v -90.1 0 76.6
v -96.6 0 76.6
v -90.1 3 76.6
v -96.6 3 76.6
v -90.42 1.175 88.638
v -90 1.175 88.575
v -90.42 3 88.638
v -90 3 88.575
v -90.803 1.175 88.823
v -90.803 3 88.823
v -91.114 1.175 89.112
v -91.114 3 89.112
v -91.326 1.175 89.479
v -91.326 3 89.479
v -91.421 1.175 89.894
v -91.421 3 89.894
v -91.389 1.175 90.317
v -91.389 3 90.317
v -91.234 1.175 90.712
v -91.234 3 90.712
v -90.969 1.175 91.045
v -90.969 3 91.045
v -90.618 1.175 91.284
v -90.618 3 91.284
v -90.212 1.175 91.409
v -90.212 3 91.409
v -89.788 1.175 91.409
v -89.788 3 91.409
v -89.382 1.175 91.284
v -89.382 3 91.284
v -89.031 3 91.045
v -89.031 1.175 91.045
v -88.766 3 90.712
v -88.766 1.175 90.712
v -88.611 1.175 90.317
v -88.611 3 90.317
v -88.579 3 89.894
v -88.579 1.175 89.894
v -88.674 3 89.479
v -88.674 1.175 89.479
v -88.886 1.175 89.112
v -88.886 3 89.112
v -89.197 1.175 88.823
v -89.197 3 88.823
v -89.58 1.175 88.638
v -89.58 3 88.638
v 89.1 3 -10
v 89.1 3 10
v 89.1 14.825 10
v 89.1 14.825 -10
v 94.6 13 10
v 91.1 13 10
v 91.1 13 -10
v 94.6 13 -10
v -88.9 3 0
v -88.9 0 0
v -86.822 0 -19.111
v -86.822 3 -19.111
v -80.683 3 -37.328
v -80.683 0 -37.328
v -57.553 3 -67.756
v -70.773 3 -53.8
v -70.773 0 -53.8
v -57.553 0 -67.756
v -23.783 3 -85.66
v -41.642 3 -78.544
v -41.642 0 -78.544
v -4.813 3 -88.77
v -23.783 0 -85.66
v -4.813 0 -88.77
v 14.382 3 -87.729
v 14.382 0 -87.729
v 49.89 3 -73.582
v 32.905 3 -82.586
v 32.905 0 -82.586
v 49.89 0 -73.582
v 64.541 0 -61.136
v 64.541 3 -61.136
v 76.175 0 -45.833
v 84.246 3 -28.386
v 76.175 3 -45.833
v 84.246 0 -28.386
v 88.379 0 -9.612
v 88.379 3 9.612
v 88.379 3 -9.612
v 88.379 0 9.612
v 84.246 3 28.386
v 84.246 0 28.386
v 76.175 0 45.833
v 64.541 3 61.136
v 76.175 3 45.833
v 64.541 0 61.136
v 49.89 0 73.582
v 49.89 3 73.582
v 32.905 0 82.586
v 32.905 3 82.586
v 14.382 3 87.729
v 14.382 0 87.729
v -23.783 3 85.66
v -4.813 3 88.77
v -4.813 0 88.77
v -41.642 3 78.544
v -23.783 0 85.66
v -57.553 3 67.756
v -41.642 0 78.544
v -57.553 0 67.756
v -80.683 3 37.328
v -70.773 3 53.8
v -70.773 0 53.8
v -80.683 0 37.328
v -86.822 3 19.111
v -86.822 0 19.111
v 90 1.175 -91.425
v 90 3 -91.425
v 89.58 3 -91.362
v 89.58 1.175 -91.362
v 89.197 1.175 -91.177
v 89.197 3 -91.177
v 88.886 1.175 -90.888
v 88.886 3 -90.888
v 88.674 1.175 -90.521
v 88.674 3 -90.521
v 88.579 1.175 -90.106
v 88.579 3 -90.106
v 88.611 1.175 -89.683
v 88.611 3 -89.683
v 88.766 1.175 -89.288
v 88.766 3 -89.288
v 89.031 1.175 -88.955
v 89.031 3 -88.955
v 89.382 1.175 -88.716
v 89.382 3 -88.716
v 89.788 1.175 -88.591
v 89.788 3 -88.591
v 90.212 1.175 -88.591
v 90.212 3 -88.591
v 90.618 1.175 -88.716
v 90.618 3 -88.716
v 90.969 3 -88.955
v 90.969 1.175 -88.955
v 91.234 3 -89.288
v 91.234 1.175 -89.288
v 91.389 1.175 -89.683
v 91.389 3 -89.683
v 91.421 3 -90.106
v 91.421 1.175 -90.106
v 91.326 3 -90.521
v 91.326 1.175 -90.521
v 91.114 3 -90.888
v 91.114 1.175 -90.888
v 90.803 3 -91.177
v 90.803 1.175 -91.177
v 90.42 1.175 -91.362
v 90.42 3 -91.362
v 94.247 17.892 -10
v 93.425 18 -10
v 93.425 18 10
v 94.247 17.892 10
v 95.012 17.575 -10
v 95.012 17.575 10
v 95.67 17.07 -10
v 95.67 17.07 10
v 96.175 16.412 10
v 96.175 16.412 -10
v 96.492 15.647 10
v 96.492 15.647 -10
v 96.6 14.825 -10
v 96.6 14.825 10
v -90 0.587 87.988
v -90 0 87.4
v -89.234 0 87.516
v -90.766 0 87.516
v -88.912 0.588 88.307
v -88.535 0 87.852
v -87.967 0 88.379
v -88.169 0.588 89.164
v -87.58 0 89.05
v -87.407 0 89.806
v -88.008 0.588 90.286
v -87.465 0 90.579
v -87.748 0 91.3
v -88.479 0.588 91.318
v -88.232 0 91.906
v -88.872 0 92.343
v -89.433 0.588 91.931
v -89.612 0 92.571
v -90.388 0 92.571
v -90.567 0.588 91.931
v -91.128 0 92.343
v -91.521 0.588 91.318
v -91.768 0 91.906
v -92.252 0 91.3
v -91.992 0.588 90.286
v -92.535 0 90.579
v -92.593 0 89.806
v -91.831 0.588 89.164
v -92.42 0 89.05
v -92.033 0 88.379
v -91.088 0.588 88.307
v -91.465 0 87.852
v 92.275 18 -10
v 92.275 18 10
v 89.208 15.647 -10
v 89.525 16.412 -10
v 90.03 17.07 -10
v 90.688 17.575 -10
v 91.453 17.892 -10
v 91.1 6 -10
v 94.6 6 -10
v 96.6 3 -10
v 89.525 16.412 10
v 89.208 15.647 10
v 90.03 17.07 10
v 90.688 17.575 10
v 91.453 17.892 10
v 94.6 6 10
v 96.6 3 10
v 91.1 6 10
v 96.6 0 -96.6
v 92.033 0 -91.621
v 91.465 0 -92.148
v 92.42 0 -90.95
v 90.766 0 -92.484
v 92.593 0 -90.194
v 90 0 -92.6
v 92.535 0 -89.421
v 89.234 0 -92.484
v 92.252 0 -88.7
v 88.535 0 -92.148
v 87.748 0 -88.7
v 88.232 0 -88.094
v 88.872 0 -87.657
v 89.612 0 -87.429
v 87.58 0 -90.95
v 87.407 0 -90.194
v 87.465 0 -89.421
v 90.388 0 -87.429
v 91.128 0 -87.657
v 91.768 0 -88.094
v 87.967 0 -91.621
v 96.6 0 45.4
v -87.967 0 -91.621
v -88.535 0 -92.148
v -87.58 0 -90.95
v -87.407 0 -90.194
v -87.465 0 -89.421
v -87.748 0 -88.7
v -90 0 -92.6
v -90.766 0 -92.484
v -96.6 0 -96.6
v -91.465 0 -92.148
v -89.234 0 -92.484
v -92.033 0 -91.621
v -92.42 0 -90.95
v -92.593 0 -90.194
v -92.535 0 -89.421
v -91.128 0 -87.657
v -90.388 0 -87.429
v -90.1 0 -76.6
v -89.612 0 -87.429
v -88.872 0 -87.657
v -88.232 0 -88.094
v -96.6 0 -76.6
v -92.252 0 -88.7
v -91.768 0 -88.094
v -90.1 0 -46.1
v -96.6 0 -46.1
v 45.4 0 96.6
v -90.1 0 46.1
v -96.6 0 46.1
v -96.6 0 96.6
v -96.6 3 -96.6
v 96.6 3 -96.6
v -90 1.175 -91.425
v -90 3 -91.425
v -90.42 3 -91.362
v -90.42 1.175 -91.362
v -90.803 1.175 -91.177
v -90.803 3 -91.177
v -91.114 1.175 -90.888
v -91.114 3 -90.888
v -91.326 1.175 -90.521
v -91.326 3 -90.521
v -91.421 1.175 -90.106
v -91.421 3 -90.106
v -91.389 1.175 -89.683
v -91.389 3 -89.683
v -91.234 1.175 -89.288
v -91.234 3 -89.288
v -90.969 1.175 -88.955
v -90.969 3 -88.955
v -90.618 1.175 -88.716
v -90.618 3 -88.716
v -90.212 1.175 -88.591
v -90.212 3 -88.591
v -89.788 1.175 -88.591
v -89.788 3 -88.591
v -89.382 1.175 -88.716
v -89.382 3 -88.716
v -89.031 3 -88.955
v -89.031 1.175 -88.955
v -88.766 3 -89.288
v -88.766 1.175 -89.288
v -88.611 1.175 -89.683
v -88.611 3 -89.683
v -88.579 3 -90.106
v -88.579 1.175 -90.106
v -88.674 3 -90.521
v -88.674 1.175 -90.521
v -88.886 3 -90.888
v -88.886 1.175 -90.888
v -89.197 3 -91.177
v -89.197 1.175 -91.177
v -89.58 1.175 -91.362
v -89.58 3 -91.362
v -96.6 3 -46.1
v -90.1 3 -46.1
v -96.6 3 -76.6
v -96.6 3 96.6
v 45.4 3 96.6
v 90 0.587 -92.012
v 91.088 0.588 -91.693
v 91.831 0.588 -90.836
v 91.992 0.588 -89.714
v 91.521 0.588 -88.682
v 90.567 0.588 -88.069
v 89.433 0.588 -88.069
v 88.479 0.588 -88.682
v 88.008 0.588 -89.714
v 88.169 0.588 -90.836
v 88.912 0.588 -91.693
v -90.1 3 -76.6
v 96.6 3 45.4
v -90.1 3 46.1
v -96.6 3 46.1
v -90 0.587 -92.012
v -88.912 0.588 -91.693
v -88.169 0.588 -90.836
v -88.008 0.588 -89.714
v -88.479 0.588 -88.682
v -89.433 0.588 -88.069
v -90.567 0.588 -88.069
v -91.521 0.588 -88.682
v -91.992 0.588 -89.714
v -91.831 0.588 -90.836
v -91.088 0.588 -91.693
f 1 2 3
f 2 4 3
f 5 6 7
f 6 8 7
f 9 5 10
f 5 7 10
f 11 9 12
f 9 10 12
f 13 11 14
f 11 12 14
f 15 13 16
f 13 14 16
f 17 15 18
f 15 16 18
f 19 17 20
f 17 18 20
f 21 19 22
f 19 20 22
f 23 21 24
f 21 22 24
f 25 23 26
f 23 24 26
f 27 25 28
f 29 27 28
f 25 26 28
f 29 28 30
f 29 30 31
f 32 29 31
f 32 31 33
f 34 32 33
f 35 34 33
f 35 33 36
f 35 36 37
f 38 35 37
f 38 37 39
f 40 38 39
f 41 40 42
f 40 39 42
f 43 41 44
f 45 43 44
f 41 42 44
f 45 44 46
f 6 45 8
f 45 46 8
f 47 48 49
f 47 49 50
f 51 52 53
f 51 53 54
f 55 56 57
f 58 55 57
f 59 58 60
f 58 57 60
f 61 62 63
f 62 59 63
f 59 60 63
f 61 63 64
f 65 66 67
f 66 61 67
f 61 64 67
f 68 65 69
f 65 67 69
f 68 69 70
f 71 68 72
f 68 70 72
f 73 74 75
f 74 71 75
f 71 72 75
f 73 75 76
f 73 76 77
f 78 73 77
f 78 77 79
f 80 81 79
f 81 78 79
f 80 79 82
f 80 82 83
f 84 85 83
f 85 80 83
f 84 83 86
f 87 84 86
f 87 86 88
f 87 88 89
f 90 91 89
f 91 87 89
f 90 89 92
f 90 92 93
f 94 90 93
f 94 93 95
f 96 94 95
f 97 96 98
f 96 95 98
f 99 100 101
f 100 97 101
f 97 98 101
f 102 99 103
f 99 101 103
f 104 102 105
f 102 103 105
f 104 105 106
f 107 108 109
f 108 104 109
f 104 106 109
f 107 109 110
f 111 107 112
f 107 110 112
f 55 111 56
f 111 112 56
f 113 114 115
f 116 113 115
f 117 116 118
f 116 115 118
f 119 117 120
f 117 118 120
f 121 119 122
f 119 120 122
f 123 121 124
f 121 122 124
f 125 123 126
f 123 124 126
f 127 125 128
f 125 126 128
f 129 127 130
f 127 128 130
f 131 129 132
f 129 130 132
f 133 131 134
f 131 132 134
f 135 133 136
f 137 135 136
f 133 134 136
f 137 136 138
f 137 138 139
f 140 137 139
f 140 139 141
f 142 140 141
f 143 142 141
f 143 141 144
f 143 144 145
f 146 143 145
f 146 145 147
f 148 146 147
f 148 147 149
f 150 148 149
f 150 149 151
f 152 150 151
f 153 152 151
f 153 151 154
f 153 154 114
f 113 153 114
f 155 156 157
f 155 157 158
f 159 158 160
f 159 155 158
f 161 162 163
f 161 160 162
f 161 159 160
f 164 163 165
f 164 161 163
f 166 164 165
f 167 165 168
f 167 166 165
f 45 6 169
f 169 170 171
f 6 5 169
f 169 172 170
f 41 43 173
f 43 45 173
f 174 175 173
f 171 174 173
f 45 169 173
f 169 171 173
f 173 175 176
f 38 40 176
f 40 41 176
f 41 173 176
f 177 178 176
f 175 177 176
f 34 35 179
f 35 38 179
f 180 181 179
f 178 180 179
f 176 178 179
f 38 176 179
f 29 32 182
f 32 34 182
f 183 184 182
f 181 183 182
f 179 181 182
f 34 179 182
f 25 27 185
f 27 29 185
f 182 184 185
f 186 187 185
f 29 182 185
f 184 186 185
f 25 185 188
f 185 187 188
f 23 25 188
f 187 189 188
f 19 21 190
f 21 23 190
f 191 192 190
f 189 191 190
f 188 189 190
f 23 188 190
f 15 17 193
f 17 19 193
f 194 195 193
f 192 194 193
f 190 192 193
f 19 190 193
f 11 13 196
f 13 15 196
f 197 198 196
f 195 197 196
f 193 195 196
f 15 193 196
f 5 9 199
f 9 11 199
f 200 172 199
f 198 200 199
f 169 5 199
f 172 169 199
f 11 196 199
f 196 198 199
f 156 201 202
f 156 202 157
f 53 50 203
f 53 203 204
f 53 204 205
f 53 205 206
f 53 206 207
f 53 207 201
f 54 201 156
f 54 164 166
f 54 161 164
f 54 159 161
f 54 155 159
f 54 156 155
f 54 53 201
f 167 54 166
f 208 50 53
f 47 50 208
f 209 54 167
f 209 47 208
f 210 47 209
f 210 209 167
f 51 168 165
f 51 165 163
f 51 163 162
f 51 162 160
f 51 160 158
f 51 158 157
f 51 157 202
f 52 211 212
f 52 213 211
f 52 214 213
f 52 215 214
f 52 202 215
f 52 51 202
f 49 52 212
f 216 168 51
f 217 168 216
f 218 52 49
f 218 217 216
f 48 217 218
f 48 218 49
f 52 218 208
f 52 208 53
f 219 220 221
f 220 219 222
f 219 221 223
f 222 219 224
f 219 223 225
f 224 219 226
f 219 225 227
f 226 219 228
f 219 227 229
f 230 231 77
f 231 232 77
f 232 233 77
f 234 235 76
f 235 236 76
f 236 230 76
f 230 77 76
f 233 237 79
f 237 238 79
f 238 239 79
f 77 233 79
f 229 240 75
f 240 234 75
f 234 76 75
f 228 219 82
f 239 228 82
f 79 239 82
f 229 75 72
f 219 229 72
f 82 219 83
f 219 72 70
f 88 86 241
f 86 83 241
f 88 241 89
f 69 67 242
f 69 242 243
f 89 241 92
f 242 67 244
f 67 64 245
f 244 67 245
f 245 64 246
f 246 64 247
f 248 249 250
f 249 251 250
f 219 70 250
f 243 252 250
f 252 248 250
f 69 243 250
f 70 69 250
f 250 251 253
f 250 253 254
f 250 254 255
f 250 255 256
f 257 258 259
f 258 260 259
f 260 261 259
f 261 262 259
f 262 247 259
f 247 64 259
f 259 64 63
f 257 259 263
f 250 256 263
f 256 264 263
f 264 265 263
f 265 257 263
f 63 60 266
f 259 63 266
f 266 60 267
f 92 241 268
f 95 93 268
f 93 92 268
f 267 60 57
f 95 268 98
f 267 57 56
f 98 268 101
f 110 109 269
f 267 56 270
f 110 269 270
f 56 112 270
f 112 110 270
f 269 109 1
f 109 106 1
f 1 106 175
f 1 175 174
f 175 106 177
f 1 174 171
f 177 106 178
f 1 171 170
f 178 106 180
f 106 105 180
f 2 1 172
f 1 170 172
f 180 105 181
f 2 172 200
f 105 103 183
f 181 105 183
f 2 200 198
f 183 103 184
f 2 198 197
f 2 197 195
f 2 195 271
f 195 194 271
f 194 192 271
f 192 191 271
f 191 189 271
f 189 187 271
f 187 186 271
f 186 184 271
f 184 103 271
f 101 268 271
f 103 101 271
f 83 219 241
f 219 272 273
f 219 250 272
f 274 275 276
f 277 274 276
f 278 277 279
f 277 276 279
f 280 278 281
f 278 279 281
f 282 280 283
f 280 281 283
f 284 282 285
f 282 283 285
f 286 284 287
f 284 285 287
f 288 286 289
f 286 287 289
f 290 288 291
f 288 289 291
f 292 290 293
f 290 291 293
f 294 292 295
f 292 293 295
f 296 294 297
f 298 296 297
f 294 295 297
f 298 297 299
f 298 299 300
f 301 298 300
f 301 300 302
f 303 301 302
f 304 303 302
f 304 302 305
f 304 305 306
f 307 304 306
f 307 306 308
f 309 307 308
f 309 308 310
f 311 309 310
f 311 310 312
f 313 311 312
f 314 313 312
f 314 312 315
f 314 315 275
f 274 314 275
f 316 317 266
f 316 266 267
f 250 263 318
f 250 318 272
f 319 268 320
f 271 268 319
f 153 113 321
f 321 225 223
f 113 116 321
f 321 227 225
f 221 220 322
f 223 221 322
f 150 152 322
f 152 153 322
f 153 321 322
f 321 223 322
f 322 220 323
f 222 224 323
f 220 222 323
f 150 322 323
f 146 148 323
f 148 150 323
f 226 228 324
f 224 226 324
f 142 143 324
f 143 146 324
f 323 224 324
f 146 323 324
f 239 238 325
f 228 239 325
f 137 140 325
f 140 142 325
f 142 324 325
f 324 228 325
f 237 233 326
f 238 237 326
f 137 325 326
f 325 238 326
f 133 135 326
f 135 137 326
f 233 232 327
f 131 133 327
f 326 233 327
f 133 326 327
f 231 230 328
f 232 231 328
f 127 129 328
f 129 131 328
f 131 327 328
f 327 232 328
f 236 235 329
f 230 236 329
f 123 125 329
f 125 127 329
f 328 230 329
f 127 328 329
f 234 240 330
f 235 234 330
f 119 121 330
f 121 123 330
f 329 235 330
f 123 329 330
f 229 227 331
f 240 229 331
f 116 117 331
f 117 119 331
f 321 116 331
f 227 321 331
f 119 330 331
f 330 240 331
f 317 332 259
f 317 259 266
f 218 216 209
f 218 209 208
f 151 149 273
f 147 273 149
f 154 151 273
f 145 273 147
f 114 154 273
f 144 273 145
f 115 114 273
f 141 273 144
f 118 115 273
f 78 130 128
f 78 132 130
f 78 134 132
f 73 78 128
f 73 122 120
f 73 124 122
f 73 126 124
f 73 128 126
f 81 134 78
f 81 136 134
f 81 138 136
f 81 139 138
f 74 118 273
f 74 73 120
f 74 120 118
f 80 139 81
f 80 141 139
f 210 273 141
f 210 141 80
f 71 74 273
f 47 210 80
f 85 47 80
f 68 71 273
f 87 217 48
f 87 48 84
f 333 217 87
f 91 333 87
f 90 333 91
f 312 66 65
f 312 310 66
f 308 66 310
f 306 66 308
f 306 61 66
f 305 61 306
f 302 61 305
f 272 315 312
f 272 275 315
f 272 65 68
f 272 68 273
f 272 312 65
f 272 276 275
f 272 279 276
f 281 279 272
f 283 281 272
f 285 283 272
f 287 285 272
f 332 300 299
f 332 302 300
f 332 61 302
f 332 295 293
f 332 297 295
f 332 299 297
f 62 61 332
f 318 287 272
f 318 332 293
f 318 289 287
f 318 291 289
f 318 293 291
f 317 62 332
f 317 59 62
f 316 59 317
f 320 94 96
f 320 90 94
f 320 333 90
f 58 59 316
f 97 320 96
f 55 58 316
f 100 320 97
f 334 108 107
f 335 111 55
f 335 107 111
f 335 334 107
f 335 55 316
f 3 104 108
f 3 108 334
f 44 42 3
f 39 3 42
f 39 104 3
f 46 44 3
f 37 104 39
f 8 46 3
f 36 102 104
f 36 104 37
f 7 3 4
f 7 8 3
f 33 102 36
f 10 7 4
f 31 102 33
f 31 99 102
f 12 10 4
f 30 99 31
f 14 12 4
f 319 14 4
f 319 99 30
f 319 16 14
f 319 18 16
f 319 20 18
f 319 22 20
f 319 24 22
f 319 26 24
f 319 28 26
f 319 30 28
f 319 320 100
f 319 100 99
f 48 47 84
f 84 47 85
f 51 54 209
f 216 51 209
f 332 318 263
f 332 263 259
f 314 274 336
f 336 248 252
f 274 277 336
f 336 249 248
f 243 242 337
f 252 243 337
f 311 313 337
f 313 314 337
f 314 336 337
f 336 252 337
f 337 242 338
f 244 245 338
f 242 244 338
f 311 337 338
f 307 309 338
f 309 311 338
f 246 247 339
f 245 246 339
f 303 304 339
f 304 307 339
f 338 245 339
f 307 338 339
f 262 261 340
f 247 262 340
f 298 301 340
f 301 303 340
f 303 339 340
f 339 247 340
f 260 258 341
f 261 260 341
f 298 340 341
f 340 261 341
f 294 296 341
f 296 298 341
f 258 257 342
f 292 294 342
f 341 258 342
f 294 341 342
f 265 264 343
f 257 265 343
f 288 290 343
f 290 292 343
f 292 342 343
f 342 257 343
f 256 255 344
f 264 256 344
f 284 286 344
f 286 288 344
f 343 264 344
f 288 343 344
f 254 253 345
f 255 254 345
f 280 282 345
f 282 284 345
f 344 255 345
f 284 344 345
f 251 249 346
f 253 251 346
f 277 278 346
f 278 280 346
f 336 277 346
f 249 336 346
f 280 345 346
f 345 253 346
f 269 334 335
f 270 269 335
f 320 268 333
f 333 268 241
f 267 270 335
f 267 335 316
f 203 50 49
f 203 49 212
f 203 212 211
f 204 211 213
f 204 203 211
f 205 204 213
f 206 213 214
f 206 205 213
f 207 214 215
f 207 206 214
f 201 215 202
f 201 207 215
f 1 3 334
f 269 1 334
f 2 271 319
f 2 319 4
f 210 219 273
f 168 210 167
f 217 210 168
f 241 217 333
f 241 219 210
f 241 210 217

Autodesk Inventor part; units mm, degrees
ref_plane "YZ Plane" through (0, 0, 0) normal (1, 0, 0) x (0, 1, 0)
ref_plane "XZ Plane" through (0, 0, 0) normal (0, 1, 0) x (-1, 0, 0)
ref_plane "XY Plane" through (0, 0, 0) normal (0, 0, 1) x (1, 0, 0)
sketch "Sketch1" plane through (0, 0, 0) normal (0, 1, 0) x (-1, 0, 0)
  line L0 (101.6, -101.6) -> (-101.6, -101.6)
  line L1 (-101.6, -101.6) -> (-101.6, 101.6)
  line L2 (-101.6, 101.6) -> (101.6, 101.6)
  line L3 (101.6, 101.6) -> (101.6, -101.6)
  line L4 (96.6, -96.6) -> (-96.6, -96.6)
  line L5 (-96.6, -96.6) -> (-96.6, 96.6)
  line L6 (-96.6, 96.6) -> (96.6, 96.6)
  line L7 (96.6, 96.6) -> (96.6, -96.6)
  line L8 (101.6, 101.6) -> (-40.4, 101.6)
  circle A0 centre (0, 0) radius 88.9
  circle A1 centre (0, 0) radius 109.3376
  line L9 (-40.4, 101.6) -> (-101.6, 40.4)
  line L10 (-45.4, 101.6) -> (-101.6, 45.4)
  line L11 (96.6, 96.6) -> (96.6, 101.6)
  line L12 (-45.4, 101.6) -> (-35.4, 101.6)
  line L13 (-35.4, 101.6) -> (-35.4, 96.6)
  line L14 (-35.4, 96.6) -> (-45.4, 96.6)
  line L15 (-45.4, 96.6) -> (-45.4, 101.6)
  circle A2 centre (0, 0) radius 111.3376
  point P0 (96.6, 51.2168)
  point P1 (101.6, 40.4)
  point P2 (101.6, -40.4)
  point P3 (96.6, -51.2168)
  point P4 (-96.6, 45.4)
  point P5 (-45.4, 96.6)
  dimension "d0" = 203.2
  dimension "d1" = 203.2
  dimension "d2" = 101.6
  dimension "d3" = 101.6
  dimension "d4" = 5
  dimension "d5" = 5
  dimension "d6" = 5
  dimension "d7" = 5
  dimension "d10" = 142
  dimension "d12" = 61.2
  dimension "d14" = 177.8
  dimension "d15" = 5
  dimension "d16" = 5
  dimension "d17" = 10
  dimension "d34" = 2
extrude "Extrusion1" add sketch "Sketch1" along normal blind 3 contours A2 L7 L4 | L4 A1 L7 A2 | L4 A1 L5 L9 L6 L7 | A2 L5 A1 L4 | L4 L5 A2 | A1 L6 A2 L7 | A2 L6 L7
sketch "Sketch5" plane through (0, 3, 0) normal (0, 1, 0) x (1, 0, 0)
  line L0 (-96.6, -96.6) -> (45.4, -96.6) projected
  circle A0 centre (0, 0) radius 88.9 projected
  line L1 (96.6, -45.4) -> (96.6, 96.6) projected
  line L2 (96.6, 0) -> (89.1, 0)
  line L3 (89.1, 0) -> (89.1, 10)
  line L4 (89.1, 10) -> (96.6, 10)
  line L5 (96.6, 10) -> (96.6, 0)
  line L6 (89.1, 0) -> (96.6, 0)
  line L7 (96.6, 0) -> (96.6, -10)
  line L8 (96.6, -10) -> (89.1, -10)
  line L9 (89.1, -10) -> (89.1, 0)
  line L10 (0, 0) -> (96.6, 0)
  point P0 (10, -96.6)
  dimension "d52" = 7.5
  dimension "d53" = 7.5
  dimension "d54" = 10
  dimension "d55" = 10
extrude "Extrusion4" add sketch "Sketch5" along normal blind 15 contours L3 L4 L1 L2 | L2 L1 L8 L9
sketch "Sketch7" plane through (89.1, 3, 10) normal (0, 0, 1) x (1, 0, 0)
  line L0 (2, 10) -> (5.5, 10)
  line L1 (5.5, 10) -> (5.5, 3)
  line L2 (5.5, 3) -> (2, 3)
  line L3 (2, 3) -> (2, 10)
  line L4 (7.5, 0) -> (7.5, 15)
  line L5 (0, 0) -> (0, 15)
  line L6 (0, 15) -> (7.5, 15)
  point P0 (-89.1, -3)
  dimension "d56" = 3.5
  dimension "d57" = 2
  dimension "d58" = 2
  dimension "d59" = 5
  dimension "d60" = 7
extrude "Extrusion6" cut sketch "Sketch7" against normal through all
fillet "Fillet7" radius 3.175 2 edges at (96.6, 18, 0) (89.1, 18, 0)
sketch "Sketch8" plane through (0, 3, 0) normal (0, 1, 0) x (1, 0, 0)
  arc A0 (-101.6, -98.425) -> (-98.425, -101.6) centre (-98.425, -98.425) ccw
  line L0 (44.0849, 101.6) -> (-98.425, 101.6)
  line L1 (-101.6, 98.425) -> (-101.6, -98.425)
  line L2 (-101.6, -46.1) -> (-101.6, -76.6)
  line L3 (-96.6, -96.6) -> (-96.6, 96.6)
  line L4 (-96.6, -46.1) -> (-96.6, -76.6)
  line L5 (-101.6, -76.6) -> (-96.6, -76.6)
  line L6 (-101.6, -46.1) -> (-96.6, -46.1)
  line L7 (-98.425, -101.6) -> (101.6, -101.6)
  line L8 (0, 0) -> (-101.6, 0)
  line L9 (-101.6, 46.1) -> (-101.6, 76.6)
  line L10 (-96.6, 46.1) -> (-96.6, 76.6)
  line L11 (-101.6, 76.6) -> (-96.6, 76.6)
  line L12 (-101.6, 46.1) -> (-96.6, 46.1)
  line L13 (-96.6, -76.6) -> (-90.1, -76.6)
  line L14 (-90.1, -76.6) -> (-90.1, -46.1)
  line L15 (-90.1, -46.1) -> (-96.6, -46.1)
  line L16 (-96.6, -46.1) -> (-96.6, -76.6)
  arc A1 (-98.425, 101.6) -> (-101.6, 98.425) centre (-98.425, 98.425) ccw
  line L17 (-101.6, 46.1) -> (-101.6, 76.6)
  line L18 (-96.6, 46.1) -> (-96.6, 76.6)
  line L19 (-101.6, 76.6) -> (-96.6, 76.6)
  line L20 (-101.6, 46.1) -> (-96.6, 46.1)
  line L21 (-96.6, 76.6) -> (-90.1, 76.6)
  line L22 (-90.1, 76.6) -> (-90.1, 46.1)
  line L23 (-90.1, 46.1) -> (-96.6, 46.1)
  line L24 (-96.6, 46.1) -> (-96.6, 76.6)
  point P0 (-98.425, 98.425)
  point P1 (46.1, 101.6)
  point P2 (46.1, 96.6)
  point P3 (76.6, 96.6)
  point P4 (76.6, 101.6)
  point P5 (-46.1, 96.6)
  dimension "d64" = 30.5
  dimension "d65" = 25
  dimension "d66" = 6.5
extrude "Extrusion7" cut sketch "Sketch8" against normal through all contours L21 L22 L23 L3 | L15 L14 L13 L3
sketch "Sketch10" plane through (0, 0, 0) normal (0, -1, 0) x (1, 0, 0)
  line L0 (-90, -90) -> (-90, 90)
  line L1 (-90, 90) -> (90, 90)
  line L2 (90, 90) -> (90, -90)
  line L3 (90, -90) -> (-90, -90)
  circle A0 centre (-90, -90) radius 1
  circle A1 centre (-90, 90) radius 1
  circle A2 centre (90, -90) radius 1
  point P0 (0, 0)
  point P1 (0, 0)
  dimension "d76" = 90
  dimension "d77" = 90
  dimension "d78" = 90
  dimension "d79" = 90
  dimension "d80" = 2
  dimension "d81" = 2
  dimension "d82" = 2
hole "Hole1" at (90, 0, -90) at (-90, 0, 90) at (-90, 0, -90) direction (0, 1, 0) diameter 2.85 depth 4 tip angle 118 countersink diameter 5.2 countersink angle 90 thread size "M3.5x0.6" class "6H" standard "ANSI Metric M Profile"
equation "\"d1\" = d0"
equation "\"d2\" = 0.5 * d0"
equation "\"d3\" = 0.5 * d0"
properties part number "Box_Walls_2"
